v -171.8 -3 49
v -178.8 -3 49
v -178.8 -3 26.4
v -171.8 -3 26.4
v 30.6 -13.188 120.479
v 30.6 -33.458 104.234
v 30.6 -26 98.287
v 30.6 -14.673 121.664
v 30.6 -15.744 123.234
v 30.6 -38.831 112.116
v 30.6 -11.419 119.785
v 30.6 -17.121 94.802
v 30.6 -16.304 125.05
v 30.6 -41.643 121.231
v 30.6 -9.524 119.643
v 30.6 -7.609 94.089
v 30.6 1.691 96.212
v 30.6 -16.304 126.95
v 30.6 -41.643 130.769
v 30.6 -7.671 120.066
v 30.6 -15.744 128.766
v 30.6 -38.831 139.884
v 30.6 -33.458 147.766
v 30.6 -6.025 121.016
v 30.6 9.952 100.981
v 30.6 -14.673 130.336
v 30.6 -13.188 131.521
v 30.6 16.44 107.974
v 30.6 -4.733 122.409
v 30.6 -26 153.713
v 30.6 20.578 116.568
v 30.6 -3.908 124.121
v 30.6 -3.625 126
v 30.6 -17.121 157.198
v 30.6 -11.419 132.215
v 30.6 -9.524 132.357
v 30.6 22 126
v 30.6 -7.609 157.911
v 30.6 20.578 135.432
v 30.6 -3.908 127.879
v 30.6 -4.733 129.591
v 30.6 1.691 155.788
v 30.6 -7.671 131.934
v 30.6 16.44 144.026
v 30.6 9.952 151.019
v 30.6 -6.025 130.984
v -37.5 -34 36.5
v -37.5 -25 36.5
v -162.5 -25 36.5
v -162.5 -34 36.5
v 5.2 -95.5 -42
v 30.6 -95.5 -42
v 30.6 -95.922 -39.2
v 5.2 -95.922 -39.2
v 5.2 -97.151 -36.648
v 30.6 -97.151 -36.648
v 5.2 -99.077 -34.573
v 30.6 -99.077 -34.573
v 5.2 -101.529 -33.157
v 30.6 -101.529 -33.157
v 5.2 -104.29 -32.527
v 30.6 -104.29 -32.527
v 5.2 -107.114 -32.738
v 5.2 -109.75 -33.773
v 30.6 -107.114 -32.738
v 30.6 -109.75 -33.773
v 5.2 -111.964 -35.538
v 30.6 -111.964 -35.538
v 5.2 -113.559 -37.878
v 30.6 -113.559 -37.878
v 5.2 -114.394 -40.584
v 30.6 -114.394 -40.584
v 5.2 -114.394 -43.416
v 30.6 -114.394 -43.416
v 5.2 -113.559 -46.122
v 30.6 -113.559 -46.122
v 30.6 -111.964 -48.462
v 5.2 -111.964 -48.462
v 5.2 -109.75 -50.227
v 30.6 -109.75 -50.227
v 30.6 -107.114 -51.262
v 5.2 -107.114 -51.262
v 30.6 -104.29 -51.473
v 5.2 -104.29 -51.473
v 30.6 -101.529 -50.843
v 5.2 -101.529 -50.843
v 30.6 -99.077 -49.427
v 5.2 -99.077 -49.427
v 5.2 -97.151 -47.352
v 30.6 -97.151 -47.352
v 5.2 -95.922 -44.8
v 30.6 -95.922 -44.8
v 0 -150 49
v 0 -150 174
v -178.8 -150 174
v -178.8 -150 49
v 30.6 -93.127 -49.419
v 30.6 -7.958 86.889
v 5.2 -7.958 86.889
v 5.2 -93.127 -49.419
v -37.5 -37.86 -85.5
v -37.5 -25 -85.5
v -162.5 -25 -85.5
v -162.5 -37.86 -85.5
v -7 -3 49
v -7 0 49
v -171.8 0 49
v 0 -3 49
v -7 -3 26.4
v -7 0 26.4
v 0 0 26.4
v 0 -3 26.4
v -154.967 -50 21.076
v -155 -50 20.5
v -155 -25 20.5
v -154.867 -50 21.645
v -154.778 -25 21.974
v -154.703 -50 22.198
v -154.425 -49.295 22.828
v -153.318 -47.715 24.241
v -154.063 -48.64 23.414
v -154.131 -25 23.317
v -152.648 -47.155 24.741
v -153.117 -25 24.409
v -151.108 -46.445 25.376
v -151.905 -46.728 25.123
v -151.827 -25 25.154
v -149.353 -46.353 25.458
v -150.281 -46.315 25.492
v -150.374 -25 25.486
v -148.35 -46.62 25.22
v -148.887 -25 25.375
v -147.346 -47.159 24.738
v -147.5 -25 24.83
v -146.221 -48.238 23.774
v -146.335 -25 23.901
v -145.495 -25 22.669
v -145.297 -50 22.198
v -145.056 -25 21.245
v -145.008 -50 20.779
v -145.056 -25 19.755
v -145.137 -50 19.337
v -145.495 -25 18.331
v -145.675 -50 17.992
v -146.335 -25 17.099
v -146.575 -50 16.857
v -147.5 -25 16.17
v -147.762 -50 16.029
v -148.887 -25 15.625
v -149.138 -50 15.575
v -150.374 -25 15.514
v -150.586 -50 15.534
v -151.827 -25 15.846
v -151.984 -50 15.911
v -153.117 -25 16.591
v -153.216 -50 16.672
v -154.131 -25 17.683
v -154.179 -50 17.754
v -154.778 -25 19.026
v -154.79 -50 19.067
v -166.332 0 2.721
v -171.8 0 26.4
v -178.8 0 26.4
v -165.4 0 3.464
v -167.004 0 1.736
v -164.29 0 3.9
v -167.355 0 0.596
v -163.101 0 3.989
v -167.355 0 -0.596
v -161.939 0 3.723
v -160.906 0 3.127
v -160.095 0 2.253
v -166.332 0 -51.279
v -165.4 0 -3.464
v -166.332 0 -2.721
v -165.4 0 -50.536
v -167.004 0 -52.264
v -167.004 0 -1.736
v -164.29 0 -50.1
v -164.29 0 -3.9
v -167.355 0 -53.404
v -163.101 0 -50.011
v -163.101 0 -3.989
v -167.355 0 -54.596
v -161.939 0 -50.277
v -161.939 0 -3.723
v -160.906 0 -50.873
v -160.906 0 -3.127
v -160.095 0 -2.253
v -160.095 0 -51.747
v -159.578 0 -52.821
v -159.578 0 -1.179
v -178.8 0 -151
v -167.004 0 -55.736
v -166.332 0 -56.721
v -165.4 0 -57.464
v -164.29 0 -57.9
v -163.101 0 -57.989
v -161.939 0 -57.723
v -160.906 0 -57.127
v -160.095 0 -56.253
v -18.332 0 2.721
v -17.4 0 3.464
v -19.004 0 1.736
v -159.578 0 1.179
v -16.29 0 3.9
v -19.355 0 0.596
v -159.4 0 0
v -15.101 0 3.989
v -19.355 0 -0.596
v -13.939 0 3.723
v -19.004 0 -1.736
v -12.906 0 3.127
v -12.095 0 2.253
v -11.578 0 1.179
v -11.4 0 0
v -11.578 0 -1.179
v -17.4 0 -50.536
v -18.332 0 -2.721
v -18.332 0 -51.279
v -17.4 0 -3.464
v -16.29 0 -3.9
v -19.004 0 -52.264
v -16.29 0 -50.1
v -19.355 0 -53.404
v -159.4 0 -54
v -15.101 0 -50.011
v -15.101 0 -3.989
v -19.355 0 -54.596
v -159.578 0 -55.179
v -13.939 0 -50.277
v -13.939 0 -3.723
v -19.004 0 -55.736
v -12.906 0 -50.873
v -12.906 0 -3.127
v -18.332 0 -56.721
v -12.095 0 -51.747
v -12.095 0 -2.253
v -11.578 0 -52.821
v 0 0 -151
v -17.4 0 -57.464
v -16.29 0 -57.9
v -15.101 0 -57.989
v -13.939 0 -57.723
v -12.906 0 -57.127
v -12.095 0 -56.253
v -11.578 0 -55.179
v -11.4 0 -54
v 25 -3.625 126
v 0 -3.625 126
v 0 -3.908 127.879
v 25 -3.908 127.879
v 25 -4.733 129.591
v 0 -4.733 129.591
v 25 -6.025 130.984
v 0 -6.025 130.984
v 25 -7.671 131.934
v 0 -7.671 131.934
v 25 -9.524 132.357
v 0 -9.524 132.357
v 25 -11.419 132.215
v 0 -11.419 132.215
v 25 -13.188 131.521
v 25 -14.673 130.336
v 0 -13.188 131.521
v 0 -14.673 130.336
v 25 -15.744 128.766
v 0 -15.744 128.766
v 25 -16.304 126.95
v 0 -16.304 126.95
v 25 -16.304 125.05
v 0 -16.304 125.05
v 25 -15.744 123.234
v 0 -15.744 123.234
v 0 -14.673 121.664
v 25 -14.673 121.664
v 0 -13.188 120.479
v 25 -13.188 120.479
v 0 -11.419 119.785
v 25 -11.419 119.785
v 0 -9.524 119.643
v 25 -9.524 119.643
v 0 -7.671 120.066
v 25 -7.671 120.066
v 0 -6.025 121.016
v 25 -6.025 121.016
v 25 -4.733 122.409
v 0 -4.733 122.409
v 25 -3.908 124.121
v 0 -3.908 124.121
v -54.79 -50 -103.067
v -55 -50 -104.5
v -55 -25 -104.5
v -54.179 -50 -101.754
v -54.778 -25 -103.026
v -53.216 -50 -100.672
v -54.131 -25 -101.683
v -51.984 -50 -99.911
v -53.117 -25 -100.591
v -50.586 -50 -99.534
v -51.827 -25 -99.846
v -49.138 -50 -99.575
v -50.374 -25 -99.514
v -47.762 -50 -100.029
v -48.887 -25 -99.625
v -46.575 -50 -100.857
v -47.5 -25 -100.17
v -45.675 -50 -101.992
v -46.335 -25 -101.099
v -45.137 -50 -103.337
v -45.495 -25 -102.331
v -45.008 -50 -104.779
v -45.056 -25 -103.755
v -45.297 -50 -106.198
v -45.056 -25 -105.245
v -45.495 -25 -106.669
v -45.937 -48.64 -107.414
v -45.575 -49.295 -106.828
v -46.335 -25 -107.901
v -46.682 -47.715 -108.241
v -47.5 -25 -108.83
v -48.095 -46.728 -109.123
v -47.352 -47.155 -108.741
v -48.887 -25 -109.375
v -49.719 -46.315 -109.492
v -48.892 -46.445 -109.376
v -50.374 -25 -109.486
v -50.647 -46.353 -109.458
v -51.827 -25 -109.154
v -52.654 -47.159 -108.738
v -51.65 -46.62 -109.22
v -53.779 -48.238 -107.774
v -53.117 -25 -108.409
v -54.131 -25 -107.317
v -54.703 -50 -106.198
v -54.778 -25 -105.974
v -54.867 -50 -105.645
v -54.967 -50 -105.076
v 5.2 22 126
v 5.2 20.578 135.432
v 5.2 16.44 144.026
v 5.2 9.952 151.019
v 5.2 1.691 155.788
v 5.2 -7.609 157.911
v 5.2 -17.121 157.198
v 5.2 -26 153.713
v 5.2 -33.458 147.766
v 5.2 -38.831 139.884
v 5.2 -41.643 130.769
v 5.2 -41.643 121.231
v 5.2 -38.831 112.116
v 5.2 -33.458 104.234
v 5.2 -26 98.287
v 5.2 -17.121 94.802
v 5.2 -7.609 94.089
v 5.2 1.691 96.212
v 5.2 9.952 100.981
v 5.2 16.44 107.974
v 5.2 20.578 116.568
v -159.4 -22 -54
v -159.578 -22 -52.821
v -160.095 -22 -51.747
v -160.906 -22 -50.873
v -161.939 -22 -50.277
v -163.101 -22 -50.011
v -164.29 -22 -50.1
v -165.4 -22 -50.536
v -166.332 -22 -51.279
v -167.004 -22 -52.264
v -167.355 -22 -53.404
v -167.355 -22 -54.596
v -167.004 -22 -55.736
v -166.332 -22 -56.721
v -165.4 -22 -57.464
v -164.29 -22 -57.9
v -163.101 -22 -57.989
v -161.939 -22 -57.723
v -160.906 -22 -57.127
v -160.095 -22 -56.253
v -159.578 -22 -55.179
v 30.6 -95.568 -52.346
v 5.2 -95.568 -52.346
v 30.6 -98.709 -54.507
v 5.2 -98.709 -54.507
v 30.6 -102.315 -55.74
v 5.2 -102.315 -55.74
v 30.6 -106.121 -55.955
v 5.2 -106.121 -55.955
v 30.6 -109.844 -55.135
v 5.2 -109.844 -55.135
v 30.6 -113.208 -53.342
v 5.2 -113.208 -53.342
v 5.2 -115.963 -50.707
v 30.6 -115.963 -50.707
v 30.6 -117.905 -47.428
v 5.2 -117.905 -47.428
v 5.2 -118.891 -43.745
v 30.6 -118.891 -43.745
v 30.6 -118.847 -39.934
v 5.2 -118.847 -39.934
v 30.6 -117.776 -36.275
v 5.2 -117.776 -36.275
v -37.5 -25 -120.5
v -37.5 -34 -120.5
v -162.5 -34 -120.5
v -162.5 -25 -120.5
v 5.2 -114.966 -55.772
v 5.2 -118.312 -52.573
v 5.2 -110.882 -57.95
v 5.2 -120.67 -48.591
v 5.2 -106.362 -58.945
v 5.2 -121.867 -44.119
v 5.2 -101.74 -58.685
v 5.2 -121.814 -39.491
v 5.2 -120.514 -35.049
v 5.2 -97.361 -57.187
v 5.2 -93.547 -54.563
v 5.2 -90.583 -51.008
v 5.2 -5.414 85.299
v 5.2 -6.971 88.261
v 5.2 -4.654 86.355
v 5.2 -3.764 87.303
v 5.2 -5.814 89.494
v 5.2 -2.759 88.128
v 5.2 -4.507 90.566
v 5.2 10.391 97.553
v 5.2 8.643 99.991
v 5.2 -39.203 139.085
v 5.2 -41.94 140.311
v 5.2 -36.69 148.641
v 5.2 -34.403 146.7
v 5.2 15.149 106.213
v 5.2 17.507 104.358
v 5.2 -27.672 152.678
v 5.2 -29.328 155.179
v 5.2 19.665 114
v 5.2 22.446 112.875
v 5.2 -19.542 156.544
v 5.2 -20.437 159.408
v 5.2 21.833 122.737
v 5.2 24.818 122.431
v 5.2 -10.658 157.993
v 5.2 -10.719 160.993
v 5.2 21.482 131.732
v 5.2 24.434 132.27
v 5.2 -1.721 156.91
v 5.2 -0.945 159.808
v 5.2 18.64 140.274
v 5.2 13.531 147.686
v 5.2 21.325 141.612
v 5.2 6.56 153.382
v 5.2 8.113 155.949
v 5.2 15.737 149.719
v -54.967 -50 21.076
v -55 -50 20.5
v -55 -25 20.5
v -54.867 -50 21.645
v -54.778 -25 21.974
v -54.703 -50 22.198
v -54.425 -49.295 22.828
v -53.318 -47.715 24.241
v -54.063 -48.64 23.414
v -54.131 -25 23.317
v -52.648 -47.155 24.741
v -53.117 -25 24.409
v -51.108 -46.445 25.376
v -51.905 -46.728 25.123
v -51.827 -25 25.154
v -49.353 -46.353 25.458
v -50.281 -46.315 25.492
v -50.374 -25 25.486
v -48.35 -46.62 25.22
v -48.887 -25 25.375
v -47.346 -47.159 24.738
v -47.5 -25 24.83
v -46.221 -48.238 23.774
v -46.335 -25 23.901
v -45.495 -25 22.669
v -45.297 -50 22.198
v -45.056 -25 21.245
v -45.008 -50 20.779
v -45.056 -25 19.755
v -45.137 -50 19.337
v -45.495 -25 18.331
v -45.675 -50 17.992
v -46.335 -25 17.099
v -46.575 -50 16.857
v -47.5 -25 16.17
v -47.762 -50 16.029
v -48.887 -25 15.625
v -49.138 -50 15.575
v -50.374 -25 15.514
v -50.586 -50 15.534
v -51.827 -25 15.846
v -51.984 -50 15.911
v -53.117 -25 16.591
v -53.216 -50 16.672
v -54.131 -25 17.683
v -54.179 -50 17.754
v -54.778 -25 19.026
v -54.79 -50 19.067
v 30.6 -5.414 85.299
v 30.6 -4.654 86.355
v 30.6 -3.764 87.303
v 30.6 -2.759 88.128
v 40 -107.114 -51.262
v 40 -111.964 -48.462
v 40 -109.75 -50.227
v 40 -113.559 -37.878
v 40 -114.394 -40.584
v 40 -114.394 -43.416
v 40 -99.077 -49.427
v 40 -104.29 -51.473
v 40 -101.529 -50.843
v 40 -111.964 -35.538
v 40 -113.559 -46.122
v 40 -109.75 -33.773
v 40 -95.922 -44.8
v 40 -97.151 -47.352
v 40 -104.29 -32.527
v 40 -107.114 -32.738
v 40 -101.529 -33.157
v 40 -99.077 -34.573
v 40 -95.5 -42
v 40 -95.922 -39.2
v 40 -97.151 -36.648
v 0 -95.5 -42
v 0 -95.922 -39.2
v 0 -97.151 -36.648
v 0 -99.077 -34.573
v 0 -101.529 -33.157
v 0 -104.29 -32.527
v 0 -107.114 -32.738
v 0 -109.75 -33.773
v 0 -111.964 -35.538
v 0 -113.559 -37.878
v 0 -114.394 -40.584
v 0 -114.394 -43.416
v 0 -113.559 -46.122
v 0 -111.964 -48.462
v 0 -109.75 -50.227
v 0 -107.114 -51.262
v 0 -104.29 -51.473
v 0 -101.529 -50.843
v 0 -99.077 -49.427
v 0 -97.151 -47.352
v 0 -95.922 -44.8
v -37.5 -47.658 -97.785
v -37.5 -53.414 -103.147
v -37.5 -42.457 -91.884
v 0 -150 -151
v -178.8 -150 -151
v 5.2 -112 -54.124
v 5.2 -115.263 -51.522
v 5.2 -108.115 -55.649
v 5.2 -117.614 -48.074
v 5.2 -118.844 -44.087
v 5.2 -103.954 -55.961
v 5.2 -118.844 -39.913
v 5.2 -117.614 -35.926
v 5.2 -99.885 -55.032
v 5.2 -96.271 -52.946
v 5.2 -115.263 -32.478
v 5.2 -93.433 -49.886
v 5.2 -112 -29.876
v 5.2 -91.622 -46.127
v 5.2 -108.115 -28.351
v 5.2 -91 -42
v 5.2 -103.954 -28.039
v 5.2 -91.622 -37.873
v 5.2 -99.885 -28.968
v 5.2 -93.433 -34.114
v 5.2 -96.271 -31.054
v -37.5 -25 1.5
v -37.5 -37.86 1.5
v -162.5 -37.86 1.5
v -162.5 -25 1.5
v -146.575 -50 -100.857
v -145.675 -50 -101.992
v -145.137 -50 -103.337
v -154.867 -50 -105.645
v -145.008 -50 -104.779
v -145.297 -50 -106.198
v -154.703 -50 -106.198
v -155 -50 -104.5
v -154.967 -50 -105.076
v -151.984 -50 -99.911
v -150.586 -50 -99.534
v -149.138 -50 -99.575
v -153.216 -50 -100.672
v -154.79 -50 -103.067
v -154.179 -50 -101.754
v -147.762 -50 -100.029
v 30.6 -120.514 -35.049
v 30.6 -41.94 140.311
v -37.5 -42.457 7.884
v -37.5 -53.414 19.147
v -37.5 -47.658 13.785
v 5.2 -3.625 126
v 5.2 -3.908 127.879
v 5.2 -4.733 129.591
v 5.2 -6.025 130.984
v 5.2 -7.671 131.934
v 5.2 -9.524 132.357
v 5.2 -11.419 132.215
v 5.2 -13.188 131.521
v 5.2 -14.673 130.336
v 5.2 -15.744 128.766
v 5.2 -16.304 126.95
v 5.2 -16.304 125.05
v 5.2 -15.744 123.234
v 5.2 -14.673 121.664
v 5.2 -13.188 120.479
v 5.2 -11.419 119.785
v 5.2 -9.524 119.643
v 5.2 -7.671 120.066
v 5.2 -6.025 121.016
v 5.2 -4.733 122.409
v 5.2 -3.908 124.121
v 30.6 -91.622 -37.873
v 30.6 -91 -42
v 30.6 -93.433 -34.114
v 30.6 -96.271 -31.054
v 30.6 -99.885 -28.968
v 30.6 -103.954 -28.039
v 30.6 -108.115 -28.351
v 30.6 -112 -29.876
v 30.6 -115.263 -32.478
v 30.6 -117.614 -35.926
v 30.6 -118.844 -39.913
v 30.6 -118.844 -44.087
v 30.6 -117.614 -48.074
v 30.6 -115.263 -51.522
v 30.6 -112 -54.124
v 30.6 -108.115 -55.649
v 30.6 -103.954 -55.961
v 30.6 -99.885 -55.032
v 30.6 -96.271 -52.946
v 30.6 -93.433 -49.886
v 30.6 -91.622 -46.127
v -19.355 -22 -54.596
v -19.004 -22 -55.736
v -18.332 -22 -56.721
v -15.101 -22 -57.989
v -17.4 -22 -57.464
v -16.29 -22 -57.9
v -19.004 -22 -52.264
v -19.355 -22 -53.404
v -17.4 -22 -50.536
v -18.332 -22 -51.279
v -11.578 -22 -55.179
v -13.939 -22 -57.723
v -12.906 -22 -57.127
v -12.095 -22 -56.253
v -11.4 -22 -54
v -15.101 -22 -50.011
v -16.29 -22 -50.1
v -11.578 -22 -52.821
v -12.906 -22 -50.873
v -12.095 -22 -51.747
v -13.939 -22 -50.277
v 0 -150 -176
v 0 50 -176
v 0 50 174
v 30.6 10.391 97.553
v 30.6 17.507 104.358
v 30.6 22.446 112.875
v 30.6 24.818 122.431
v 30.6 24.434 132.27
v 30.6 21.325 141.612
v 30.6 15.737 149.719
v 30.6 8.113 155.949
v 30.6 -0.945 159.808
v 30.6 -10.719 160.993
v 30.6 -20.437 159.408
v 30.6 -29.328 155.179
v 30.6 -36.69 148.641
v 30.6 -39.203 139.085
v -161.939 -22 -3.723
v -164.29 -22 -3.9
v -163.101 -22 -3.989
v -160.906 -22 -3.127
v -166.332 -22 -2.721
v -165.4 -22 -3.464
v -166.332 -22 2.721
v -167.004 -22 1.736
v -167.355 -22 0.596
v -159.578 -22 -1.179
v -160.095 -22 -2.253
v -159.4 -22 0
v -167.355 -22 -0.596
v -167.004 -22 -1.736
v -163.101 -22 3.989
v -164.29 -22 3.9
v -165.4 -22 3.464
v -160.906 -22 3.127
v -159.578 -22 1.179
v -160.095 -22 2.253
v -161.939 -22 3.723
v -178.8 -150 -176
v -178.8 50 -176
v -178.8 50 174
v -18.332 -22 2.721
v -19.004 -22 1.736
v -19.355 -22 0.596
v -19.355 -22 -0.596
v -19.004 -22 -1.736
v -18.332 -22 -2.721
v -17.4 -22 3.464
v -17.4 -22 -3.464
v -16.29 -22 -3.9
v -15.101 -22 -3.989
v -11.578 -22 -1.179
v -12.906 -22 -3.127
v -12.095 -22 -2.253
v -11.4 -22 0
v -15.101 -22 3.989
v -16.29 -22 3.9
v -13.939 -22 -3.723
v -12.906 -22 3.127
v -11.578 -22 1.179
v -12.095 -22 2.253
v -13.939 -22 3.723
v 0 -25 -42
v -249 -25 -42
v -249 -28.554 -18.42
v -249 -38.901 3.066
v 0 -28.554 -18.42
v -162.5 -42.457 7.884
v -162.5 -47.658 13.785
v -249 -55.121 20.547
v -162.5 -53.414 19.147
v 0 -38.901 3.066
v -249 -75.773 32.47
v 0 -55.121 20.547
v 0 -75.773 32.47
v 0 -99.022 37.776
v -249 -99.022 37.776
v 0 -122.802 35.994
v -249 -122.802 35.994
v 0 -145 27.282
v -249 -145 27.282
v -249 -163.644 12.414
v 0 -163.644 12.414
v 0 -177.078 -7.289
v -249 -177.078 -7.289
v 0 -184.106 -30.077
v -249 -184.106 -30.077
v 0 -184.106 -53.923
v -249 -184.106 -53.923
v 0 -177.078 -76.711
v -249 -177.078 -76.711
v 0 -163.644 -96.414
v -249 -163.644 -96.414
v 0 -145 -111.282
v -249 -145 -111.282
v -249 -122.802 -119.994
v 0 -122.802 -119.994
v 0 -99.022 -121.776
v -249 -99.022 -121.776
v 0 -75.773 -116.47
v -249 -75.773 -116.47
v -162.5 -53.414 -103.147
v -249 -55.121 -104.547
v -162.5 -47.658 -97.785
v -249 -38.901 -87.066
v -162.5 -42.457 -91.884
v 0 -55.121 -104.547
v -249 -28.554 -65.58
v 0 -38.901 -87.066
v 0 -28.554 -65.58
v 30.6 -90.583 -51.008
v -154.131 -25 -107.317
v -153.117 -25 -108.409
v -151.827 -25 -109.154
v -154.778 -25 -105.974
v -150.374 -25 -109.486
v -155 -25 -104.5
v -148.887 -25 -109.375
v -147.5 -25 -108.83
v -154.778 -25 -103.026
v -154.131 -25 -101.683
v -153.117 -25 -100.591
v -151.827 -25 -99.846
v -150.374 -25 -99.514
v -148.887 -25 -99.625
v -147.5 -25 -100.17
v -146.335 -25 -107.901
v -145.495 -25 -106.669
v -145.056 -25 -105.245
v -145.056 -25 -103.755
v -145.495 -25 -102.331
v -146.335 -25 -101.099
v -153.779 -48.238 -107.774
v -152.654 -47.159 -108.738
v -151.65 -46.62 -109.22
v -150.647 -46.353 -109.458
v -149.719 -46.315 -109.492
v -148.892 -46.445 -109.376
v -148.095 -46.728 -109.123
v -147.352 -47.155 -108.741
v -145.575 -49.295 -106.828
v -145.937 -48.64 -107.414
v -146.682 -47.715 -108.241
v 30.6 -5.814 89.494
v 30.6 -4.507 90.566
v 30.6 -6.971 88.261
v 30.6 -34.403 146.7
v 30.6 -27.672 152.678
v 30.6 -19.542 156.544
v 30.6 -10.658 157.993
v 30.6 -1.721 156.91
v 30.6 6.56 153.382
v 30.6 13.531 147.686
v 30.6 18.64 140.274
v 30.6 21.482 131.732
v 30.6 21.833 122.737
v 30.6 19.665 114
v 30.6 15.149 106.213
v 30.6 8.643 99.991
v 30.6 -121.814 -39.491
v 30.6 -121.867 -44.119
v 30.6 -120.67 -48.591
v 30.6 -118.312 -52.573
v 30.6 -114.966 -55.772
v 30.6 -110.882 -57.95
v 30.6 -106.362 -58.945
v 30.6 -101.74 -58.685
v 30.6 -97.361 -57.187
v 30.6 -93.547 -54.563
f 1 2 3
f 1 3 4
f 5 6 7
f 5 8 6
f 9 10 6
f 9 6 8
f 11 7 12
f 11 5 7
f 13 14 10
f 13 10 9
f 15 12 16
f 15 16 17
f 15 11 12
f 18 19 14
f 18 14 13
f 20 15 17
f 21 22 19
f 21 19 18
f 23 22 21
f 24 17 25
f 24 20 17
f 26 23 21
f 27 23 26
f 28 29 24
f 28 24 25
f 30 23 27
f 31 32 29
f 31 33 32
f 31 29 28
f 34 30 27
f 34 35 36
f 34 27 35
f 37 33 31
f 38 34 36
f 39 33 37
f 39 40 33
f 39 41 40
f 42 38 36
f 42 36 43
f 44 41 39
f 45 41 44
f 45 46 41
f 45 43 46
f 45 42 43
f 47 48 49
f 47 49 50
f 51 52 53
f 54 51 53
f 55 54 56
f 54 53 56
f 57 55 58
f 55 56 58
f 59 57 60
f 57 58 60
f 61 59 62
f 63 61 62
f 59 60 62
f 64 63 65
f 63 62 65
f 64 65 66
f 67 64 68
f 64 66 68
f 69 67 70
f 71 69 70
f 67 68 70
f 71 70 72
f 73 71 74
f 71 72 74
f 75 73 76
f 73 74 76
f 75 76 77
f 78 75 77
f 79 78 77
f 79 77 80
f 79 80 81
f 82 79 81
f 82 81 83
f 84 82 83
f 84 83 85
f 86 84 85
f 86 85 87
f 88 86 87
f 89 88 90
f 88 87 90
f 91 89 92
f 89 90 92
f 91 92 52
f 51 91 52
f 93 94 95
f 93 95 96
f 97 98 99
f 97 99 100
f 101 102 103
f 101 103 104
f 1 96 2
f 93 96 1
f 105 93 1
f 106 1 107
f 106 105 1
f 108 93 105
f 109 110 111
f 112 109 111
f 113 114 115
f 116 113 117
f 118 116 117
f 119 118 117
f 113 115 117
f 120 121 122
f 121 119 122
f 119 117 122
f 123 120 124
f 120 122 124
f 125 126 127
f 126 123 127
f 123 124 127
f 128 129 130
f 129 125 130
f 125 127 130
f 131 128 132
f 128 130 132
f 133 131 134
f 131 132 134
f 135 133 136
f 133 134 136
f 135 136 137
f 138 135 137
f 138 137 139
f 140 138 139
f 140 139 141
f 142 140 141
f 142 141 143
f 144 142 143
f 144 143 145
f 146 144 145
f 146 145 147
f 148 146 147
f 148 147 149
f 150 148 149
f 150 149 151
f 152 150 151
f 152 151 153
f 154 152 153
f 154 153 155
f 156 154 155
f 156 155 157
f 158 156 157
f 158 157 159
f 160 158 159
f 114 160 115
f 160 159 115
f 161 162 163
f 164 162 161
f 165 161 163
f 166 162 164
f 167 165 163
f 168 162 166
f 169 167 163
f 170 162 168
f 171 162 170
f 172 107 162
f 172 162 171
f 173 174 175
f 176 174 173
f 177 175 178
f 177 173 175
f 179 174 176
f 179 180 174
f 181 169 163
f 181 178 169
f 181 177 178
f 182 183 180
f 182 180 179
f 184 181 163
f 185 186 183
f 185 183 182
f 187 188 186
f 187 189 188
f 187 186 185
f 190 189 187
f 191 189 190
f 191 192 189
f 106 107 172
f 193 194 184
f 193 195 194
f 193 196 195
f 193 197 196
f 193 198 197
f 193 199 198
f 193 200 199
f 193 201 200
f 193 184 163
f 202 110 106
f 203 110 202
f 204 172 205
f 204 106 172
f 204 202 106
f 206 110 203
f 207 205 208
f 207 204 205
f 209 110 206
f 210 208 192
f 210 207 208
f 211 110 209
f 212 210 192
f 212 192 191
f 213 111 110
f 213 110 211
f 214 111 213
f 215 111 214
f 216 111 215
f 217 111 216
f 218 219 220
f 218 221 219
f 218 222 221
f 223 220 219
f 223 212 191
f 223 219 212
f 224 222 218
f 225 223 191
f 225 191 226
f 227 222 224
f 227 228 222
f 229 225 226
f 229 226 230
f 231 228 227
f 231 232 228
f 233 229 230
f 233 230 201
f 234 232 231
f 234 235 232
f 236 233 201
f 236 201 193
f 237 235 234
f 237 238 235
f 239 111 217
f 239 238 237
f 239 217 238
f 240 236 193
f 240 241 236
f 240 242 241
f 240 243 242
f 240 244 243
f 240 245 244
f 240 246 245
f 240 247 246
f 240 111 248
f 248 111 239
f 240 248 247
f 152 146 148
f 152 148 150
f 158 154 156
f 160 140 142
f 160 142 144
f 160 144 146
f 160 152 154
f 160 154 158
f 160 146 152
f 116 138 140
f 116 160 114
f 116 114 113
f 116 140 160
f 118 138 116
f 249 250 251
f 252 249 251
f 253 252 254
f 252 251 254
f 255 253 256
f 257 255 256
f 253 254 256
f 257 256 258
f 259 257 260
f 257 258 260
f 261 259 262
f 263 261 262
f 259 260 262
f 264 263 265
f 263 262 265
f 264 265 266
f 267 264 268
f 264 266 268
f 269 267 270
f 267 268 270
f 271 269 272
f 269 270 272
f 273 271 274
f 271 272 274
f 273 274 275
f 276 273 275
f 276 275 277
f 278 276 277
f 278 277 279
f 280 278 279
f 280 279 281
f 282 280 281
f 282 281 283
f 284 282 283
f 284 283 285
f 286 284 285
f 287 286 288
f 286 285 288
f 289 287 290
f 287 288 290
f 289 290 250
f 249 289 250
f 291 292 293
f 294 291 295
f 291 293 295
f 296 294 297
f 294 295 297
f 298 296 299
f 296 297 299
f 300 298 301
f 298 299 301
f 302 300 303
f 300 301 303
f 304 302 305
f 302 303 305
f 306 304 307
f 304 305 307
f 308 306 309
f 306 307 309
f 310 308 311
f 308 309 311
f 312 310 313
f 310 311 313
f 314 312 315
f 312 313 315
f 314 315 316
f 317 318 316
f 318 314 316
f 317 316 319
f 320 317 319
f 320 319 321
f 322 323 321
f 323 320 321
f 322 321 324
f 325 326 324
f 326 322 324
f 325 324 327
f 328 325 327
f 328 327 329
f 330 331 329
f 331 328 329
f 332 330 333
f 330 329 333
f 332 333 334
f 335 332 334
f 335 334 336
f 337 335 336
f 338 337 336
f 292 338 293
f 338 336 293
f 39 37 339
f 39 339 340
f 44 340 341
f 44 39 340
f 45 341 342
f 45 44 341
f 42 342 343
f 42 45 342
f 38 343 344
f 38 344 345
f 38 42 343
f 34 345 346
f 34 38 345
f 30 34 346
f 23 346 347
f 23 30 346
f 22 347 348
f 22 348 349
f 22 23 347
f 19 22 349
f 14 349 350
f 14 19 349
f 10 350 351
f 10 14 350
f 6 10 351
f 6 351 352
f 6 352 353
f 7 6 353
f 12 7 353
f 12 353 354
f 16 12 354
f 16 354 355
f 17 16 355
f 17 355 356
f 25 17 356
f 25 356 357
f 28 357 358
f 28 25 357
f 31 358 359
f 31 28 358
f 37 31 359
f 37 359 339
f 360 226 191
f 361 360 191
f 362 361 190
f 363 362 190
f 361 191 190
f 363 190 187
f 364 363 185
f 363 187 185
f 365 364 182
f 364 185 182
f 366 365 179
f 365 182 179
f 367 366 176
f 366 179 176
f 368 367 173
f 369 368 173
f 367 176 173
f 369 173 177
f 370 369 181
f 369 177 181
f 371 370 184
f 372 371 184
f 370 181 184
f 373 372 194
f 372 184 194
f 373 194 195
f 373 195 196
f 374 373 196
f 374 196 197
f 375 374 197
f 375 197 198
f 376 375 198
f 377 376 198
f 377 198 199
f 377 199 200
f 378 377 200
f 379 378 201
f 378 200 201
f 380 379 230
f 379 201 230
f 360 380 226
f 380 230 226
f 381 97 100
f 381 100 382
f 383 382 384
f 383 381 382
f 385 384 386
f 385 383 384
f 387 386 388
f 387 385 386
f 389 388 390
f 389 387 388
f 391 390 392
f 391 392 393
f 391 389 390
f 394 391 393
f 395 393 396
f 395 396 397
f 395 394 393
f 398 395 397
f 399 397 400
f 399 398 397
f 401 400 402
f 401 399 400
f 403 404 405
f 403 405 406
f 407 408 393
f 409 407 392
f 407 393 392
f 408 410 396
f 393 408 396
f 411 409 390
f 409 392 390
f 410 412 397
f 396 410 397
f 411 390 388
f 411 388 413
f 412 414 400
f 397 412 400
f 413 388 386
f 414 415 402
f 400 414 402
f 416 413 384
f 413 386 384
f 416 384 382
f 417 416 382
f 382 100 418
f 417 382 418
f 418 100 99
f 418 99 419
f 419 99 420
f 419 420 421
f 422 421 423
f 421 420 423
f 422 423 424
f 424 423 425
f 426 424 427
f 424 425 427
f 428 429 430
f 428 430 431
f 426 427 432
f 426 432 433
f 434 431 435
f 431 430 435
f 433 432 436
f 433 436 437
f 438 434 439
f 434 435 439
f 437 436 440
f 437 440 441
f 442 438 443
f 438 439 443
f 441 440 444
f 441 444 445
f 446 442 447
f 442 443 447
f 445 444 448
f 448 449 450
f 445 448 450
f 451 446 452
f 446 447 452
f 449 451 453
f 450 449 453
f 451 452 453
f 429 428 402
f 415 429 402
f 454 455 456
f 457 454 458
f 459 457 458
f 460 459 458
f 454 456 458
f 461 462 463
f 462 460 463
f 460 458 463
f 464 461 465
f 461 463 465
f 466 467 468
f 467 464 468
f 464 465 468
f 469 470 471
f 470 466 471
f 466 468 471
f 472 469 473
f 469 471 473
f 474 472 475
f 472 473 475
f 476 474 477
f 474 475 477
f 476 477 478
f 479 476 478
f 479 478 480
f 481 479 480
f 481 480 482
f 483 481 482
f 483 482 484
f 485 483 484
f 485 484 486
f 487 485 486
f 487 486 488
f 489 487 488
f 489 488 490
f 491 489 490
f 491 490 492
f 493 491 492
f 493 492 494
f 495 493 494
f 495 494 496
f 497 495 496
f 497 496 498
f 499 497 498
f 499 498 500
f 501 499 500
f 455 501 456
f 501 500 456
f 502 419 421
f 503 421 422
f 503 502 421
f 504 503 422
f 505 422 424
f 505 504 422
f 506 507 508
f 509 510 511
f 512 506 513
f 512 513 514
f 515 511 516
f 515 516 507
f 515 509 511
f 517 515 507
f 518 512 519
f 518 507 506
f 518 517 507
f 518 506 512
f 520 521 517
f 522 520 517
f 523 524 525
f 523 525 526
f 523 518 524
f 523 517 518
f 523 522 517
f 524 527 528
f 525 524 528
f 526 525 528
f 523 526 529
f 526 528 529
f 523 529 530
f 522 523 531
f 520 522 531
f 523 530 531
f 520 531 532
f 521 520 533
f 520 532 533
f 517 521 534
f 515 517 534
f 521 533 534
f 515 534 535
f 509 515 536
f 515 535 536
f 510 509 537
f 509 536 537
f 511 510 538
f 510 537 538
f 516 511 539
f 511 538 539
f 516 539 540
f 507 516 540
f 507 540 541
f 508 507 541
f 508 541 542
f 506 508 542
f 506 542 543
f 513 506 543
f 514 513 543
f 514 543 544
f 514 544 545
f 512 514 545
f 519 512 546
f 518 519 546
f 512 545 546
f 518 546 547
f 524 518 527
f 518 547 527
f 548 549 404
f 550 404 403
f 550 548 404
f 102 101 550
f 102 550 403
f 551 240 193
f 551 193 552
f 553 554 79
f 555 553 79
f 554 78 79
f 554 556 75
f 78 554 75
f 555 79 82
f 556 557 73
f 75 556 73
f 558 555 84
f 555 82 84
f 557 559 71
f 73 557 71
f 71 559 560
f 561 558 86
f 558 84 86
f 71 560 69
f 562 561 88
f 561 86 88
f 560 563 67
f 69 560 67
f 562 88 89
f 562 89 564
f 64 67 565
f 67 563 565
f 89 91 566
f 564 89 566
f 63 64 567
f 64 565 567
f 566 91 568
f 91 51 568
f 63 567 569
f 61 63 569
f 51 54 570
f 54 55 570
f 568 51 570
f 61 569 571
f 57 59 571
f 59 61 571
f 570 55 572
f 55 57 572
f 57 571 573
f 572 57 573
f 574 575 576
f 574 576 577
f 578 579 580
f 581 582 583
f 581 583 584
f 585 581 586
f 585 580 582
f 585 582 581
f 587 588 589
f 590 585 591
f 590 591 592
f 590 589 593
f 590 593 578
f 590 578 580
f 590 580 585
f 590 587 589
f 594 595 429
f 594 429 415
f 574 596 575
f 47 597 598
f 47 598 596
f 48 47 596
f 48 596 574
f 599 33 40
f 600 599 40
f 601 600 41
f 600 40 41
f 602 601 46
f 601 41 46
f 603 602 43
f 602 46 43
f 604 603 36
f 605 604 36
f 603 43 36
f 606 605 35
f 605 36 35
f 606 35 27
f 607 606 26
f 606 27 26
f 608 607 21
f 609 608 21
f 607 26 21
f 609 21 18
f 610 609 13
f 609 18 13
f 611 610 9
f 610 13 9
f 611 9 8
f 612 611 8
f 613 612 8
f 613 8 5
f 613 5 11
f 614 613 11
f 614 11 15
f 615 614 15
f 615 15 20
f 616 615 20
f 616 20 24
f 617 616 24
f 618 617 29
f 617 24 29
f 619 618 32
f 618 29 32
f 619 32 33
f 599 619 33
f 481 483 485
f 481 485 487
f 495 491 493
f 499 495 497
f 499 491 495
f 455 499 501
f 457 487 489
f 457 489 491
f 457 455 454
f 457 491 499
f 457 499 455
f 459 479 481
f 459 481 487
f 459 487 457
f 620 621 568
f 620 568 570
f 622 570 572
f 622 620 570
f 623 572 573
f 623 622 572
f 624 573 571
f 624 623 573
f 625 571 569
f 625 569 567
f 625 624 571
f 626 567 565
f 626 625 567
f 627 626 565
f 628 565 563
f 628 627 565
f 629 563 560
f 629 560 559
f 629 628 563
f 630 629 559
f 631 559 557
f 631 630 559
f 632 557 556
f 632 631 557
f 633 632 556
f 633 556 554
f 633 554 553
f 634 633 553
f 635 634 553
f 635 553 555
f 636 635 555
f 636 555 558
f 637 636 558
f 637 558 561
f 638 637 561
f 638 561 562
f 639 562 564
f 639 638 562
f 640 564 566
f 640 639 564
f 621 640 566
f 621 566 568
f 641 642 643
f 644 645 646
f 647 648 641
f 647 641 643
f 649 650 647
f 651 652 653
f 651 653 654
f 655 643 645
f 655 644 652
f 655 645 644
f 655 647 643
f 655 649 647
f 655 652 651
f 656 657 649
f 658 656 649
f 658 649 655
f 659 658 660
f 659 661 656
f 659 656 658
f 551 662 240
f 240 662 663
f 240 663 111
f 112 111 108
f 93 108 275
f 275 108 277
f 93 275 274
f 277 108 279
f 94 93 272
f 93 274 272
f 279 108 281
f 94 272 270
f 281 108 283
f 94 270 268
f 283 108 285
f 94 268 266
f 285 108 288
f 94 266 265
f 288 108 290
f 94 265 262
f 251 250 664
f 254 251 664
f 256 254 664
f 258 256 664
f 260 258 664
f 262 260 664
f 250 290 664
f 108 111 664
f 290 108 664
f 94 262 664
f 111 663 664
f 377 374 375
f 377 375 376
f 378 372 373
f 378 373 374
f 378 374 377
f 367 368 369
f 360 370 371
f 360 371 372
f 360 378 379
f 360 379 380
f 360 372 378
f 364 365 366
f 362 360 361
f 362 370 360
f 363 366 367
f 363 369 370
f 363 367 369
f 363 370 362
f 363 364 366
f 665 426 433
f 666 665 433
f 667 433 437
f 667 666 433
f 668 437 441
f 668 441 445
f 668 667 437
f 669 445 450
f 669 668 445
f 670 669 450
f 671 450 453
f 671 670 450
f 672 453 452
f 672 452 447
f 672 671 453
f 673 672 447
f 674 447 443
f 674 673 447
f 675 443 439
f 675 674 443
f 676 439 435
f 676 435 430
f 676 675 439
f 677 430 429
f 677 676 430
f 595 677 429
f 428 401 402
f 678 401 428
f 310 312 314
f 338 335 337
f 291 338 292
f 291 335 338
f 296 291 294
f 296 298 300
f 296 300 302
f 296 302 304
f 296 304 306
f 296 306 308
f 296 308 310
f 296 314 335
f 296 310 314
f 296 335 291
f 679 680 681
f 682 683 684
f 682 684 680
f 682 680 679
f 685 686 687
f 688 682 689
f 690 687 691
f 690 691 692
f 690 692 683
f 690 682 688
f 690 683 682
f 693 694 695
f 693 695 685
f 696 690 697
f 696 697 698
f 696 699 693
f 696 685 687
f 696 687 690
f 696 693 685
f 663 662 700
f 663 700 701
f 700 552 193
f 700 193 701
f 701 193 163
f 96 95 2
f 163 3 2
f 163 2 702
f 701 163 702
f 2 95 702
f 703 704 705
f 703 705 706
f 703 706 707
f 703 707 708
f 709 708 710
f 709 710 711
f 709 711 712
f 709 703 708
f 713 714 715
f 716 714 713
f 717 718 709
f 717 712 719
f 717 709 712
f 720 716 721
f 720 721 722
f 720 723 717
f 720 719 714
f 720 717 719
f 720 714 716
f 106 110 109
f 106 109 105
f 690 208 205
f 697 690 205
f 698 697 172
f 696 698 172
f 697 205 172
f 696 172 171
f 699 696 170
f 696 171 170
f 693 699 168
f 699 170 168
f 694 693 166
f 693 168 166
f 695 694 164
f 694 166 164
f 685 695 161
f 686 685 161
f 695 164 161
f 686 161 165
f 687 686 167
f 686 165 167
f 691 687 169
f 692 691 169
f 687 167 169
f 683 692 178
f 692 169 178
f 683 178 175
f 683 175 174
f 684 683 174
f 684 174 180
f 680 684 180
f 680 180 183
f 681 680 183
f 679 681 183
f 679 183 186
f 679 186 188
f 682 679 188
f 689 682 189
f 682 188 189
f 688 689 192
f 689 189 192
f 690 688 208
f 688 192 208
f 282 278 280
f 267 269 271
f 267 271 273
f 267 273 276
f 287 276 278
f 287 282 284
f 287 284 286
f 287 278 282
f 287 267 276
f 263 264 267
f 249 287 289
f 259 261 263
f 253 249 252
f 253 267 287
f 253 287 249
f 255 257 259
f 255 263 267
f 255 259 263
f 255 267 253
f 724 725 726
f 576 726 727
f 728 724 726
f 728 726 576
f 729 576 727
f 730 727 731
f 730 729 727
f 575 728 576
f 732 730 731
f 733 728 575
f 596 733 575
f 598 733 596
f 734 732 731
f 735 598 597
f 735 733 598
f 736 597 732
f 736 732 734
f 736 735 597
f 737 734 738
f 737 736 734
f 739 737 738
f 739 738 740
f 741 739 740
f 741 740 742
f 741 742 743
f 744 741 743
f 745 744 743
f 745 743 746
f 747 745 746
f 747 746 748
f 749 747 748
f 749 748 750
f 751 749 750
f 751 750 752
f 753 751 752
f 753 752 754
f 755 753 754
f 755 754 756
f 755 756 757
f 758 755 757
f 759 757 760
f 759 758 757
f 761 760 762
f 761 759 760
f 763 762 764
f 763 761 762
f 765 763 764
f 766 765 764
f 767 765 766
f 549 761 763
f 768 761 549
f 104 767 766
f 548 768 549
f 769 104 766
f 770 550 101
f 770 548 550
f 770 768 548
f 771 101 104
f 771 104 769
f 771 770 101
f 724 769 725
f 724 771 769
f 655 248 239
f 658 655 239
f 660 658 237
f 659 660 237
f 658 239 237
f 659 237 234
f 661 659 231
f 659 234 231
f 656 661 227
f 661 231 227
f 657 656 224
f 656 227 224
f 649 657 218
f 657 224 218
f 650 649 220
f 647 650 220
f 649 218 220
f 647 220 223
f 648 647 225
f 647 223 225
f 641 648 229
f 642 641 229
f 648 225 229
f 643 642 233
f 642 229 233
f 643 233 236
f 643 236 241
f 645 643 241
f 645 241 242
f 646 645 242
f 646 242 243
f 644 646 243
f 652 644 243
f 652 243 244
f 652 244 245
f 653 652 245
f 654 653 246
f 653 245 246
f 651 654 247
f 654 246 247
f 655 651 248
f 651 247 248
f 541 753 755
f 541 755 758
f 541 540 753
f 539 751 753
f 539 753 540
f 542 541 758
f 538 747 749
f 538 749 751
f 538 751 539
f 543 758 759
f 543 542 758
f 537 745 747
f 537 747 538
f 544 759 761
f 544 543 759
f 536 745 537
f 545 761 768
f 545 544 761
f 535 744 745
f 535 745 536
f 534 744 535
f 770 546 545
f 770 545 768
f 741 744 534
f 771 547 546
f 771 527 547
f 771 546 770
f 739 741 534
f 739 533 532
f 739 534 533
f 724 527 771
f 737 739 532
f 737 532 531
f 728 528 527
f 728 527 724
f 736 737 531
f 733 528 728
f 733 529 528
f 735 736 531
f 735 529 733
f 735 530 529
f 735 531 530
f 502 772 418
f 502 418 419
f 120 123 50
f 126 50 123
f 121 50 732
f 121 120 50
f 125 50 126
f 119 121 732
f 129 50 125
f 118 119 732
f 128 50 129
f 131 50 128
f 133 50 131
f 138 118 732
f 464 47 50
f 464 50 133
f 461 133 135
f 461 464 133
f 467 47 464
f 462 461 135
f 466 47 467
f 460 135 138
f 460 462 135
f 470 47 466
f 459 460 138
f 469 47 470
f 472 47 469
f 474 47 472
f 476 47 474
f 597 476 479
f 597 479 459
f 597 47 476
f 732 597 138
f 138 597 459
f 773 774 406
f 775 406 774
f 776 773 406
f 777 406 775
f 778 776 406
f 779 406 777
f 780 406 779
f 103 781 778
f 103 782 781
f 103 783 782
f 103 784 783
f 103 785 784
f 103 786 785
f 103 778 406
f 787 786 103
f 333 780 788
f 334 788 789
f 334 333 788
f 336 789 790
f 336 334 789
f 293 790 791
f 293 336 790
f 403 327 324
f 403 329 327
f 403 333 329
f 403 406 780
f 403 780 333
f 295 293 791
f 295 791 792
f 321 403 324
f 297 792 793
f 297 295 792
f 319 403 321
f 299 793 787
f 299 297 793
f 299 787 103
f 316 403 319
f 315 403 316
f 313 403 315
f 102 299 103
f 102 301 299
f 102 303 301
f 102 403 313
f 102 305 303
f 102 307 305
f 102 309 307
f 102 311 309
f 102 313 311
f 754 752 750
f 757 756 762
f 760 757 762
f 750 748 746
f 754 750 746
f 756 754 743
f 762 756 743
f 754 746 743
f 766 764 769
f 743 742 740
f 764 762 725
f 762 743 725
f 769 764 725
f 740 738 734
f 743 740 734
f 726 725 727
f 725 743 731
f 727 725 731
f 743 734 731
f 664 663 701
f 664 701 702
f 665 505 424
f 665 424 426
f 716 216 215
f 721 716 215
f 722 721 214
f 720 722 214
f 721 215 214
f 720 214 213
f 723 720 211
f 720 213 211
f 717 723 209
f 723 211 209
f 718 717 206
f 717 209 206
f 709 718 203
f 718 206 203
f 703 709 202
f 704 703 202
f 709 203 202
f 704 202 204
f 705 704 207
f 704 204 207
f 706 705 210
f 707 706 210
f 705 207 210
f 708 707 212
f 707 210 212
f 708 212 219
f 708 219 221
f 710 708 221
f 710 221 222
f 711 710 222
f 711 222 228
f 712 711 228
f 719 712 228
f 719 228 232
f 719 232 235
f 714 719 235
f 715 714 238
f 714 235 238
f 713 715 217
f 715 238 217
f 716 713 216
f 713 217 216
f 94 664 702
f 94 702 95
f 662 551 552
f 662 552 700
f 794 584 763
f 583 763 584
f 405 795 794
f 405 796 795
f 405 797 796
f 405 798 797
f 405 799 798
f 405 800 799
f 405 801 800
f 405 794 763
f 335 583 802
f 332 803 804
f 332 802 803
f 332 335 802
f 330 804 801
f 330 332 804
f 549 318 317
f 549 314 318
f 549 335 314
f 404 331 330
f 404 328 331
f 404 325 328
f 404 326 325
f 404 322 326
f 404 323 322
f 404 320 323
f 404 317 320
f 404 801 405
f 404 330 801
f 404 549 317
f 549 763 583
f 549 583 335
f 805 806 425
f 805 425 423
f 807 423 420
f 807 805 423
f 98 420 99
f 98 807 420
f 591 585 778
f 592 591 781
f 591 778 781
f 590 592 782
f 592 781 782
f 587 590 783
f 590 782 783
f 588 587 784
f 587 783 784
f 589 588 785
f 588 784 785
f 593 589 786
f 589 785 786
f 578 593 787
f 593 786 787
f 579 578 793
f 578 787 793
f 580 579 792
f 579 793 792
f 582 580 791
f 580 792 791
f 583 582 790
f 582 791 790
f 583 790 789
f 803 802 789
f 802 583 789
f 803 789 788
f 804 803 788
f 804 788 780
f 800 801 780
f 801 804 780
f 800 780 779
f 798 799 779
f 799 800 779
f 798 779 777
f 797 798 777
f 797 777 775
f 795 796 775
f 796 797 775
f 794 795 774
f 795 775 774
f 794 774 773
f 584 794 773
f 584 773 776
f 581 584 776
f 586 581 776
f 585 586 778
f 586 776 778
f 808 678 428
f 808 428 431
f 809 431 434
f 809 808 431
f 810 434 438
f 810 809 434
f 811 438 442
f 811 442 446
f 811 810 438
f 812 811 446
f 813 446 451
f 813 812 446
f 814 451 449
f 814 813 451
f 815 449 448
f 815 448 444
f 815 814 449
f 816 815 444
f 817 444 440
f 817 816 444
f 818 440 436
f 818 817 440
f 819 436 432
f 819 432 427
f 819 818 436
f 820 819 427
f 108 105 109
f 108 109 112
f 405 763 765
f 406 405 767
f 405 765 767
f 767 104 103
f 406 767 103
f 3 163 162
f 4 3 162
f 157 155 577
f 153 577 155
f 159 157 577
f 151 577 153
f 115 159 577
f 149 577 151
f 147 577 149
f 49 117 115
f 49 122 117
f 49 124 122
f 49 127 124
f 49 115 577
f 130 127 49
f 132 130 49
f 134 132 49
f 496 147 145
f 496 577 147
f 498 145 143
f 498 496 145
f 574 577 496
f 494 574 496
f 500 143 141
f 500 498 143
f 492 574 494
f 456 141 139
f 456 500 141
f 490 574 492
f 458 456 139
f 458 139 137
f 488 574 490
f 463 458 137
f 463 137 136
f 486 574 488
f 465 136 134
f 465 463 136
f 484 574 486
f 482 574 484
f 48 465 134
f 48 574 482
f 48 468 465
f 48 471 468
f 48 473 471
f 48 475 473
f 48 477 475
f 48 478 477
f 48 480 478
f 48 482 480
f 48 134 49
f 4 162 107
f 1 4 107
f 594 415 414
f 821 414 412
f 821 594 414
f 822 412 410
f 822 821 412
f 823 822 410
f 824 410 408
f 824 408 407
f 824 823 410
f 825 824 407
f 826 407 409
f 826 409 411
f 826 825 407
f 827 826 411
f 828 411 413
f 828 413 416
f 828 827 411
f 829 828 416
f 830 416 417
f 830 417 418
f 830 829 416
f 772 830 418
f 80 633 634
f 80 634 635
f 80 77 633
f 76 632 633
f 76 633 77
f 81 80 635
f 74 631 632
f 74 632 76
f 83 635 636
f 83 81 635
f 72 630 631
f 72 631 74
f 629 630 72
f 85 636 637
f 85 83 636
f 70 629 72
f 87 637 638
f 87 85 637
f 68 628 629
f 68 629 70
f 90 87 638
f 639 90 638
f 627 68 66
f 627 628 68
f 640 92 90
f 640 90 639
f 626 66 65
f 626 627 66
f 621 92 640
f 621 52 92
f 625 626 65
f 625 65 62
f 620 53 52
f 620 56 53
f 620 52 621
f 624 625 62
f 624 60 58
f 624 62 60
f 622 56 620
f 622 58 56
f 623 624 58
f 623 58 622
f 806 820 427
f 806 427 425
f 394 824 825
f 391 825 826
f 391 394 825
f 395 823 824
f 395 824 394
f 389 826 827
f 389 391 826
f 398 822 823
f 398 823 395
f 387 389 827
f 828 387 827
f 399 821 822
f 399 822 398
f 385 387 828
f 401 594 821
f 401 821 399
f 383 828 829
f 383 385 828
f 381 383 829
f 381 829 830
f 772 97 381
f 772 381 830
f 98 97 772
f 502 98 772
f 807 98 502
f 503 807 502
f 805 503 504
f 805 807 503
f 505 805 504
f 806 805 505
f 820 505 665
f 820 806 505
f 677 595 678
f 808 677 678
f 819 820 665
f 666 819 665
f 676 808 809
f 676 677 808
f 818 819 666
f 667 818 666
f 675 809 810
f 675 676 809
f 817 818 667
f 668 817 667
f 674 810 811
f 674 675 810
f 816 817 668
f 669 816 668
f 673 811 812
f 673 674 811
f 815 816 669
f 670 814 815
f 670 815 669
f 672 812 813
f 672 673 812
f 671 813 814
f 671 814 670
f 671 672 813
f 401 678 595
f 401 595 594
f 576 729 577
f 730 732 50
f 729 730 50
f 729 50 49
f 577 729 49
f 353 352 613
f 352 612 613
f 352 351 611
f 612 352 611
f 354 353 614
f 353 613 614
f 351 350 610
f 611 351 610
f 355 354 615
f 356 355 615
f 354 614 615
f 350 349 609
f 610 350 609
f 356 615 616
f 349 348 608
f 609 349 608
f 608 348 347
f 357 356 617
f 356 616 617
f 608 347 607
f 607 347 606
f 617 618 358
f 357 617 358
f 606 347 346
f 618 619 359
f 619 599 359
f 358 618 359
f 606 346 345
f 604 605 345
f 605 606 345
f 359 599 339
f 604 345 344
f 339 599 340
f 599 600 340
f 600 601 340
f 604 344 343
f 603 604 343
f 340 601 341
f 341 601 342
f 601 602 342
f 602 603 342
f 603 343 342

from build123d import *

# Parameters (mm, degrees)
F0_R      = 6.375
F1_DEPTH  = 25
F3_DEPTH  = 178.8
F4_R      = 4
F5_DEPTH  = 22
F6_W      = 7
F6_H      = 22.6
F7_DEPTH  = 3
F8_R      = 80
F9_DEPTH  = 249
F12_DEPTH = 125
F14_R     = 32
F14_R_2   = 6.375
F15_DEPTH = 25.4
F16_R     = 14
F16_R_2   = 9.5
F17_DEPTH = 25.4
F18_R     = 5
F19_DEPTH = 25
F20_R     = 9.5
F21_DEPTH = 40
F23_DEPTH = 25.4


with BuildPart() as f1:
    # F0 (on Right) → F1 (new body)
    with BuildSketch(Plane.YZ):
        with Locations((-10, 126)):
            Circle(F0_R)
    extrude(amount=F1_DEPTH)

    # F2 (on Right) → F3 (join)
    with BuildSketch(Plane.YZ):
        Polygon((0, 49), (0, -151), (-150, -151), (-150, -176), (50, -176), (50, 174), (-150, 174), (-150, 49), align=None)
    extrude(amount=-F3_DEPTH)

    # F4 (on Front) → F5 (join)
    with BuildSketch(Plane.XZ):
        with Locations((-15.4, 0)):
            Circle(F4_R)
        with Locations((-163.4, 0)):
            Circle(F4_R)
        with Locations((-163.4, -54)):
            Circle(F4_R)
        with Locations((-15.4, -54)):
            Circle(F4_R)
    extrude(amount=F5_DEPTH)

    # F6 (on face) → F7 (join)
    with BuildSketch(Plane.XZ):
        with Locations((-3.5, 37.7)):
            Rectangle(F6_W, F6_H)
        with Locations((-175.3, 37.7)):
            Rectangle(F6_W, F6_H)
    extrude(amount=F7_DEPTH)


with BuildPart() as f9:
    # F8 (on Right) → F9 (new body)
    with BuildSketch(Plane.YZ):
        with Locations((-105, -42)):
            Circle(F8_R)
    extrude(amount=-F9_DEPTH)

    # F11 (on offset) → F12 (join)
    with BuildSketch(Plane.YZ.offset(-37.5)):
        with BuildLine():
            Line((-25, 1.5), (-25, 36.5))
            Line((-25, 36.5), (-34, 36.5))
            Line((-34, 36.5), (-53.4142365036, 19.146618913))
            ThreePointArc((-53.4142365036, 19.146618913), (-44.9850899063, 10.8981149612), (-37.8602204353, 1.5))
            Line((-37.8602204353, 1.5), (-25, 1.5))
        make_face()
        with BuildLine():
            Line((-25, -120.5), (-25, -85.5))
            Line((-25, -85.5), (-37.8602204353, -85.5))
            ThreePointArc((-37.8602204353, -85.5), (-44.9850899063, -94.8981149612), (-53.4142365036, -103.146618913))
            Line((-53.4142365036, -103.146618913), (-34, -120.5))
            Line((-34, -120.5), (-25, -120.5))
        make_face()
    extrude(amount=-F12_DEPTH)

    # F18 (on face) → F19 (cut)
    with BuildSketch(Plane(origin=(0, -25, 0), x_dir=(-1, 0, 0), z_dir=(0, 1, 0))):
        with Locations((50, 20.5)):
            Circle(F18_R)
        with Locations((150, 20.5)):
            Circle(F18_R)
        with Locations((150, -104.5)):
            Circle(F18_R)
        with Locations((50, -104.5)):
            Circle(F18_R)
    extrude(amount=-F19_DEPTH, mode=Mode.SUBTRACT)

    # F20 (on face) → F21 (join)
    with BuildSketch(Plane.YZ):
        with Locations((-105, -42)):
            Circle(F20_R)
    extrude(amount=F21_DEPTH)


with BuildPart() as f15:
    # F14 (on offset) → F15 (new body)
    with BuildSketch(Plane.YZ.offset(30.6)):
        with Locations((-10, 126)):
            Circle(F14_R)
        with Locations((-10, 126)):
            Circle(F14_R_2, mode=Mode.SUBTRACT)
    extrude(amount=-F15_DEPTH)


with BuildPart() as f17:
    # F16 (on offset) → F17 (new body)
    with BuildSketch(Plane.YZ.offset(30.6)):
        with Locations((-105, -42)):
            Circle(F16_R)
        with Locations((-105, -42)):
            Circle(F16_R_2, mode=Mode.SUBTRACT)
    extrude(amount=-F17_DEPTH)


with BuildPart() as f23:
    # F22 (on offset) → F23 (new body)
    with BuildSketch(Plane.YZ.offset(30.6)):
        with BuildLine():
            Line((-41.940285012, 140.3114706913), (-120.5138527201, -35.0487142356))
            ThreePointArc((-120.5138527201, -35.0487142356), (-112.9985919726, -57.000750863), (-90.5829491892, -51.0082543215))
            Line((-90.5829491892, -51.0082543215), (-5.4136460596, 85.2989731303))
            ThreePointArc((-5.4136460596, 85.2989731303), (-4.2247545268, 86.8432976933), (-2.7588939467, 88.1276863388))
            Line((-2.7588939467, 88.1276863388), (10.3905310387, 97.5530978144))
            ThreePointArc((10.3905310387, 97.5530978144), (12.1454017119, 153.1031581742), (-41.940285012, 140.3114706913))
        make_face()
        with BuildLine():
            ThreePointArc((-39.2025462967, 139.0847732035), (10.2472244223, 150.7800303307), (8.6427712354, 99.991403716))
            Line((8.6427712354, 99.991403716), (-4.50665375, 90.5659922404))
            ThreePointArc((-4.50665375, 90.5659922404), (-6.4122725042, 88.8962870013), (-7.9578314968, 86.8886650693))
            Line((-7.9578314968, 86.8886650693), (-93.1271346264, -49.4185623824))
            ThreePointArc((-93.1271346264, -49.4185623824), (-111.5870757422, -54.3535595343), (-117.7761140048, -36.2754117235))
            Line((-117.7761140048, -36.2754117235), (-39.2025462967, 139.0847732035))
        make_face(mode=Mode.SUBTRACT)
    extrude(amount=-F23_DEPTH)


solid = Compound([f1.part, f9.part, f15.part, f17.part, f23.part])
